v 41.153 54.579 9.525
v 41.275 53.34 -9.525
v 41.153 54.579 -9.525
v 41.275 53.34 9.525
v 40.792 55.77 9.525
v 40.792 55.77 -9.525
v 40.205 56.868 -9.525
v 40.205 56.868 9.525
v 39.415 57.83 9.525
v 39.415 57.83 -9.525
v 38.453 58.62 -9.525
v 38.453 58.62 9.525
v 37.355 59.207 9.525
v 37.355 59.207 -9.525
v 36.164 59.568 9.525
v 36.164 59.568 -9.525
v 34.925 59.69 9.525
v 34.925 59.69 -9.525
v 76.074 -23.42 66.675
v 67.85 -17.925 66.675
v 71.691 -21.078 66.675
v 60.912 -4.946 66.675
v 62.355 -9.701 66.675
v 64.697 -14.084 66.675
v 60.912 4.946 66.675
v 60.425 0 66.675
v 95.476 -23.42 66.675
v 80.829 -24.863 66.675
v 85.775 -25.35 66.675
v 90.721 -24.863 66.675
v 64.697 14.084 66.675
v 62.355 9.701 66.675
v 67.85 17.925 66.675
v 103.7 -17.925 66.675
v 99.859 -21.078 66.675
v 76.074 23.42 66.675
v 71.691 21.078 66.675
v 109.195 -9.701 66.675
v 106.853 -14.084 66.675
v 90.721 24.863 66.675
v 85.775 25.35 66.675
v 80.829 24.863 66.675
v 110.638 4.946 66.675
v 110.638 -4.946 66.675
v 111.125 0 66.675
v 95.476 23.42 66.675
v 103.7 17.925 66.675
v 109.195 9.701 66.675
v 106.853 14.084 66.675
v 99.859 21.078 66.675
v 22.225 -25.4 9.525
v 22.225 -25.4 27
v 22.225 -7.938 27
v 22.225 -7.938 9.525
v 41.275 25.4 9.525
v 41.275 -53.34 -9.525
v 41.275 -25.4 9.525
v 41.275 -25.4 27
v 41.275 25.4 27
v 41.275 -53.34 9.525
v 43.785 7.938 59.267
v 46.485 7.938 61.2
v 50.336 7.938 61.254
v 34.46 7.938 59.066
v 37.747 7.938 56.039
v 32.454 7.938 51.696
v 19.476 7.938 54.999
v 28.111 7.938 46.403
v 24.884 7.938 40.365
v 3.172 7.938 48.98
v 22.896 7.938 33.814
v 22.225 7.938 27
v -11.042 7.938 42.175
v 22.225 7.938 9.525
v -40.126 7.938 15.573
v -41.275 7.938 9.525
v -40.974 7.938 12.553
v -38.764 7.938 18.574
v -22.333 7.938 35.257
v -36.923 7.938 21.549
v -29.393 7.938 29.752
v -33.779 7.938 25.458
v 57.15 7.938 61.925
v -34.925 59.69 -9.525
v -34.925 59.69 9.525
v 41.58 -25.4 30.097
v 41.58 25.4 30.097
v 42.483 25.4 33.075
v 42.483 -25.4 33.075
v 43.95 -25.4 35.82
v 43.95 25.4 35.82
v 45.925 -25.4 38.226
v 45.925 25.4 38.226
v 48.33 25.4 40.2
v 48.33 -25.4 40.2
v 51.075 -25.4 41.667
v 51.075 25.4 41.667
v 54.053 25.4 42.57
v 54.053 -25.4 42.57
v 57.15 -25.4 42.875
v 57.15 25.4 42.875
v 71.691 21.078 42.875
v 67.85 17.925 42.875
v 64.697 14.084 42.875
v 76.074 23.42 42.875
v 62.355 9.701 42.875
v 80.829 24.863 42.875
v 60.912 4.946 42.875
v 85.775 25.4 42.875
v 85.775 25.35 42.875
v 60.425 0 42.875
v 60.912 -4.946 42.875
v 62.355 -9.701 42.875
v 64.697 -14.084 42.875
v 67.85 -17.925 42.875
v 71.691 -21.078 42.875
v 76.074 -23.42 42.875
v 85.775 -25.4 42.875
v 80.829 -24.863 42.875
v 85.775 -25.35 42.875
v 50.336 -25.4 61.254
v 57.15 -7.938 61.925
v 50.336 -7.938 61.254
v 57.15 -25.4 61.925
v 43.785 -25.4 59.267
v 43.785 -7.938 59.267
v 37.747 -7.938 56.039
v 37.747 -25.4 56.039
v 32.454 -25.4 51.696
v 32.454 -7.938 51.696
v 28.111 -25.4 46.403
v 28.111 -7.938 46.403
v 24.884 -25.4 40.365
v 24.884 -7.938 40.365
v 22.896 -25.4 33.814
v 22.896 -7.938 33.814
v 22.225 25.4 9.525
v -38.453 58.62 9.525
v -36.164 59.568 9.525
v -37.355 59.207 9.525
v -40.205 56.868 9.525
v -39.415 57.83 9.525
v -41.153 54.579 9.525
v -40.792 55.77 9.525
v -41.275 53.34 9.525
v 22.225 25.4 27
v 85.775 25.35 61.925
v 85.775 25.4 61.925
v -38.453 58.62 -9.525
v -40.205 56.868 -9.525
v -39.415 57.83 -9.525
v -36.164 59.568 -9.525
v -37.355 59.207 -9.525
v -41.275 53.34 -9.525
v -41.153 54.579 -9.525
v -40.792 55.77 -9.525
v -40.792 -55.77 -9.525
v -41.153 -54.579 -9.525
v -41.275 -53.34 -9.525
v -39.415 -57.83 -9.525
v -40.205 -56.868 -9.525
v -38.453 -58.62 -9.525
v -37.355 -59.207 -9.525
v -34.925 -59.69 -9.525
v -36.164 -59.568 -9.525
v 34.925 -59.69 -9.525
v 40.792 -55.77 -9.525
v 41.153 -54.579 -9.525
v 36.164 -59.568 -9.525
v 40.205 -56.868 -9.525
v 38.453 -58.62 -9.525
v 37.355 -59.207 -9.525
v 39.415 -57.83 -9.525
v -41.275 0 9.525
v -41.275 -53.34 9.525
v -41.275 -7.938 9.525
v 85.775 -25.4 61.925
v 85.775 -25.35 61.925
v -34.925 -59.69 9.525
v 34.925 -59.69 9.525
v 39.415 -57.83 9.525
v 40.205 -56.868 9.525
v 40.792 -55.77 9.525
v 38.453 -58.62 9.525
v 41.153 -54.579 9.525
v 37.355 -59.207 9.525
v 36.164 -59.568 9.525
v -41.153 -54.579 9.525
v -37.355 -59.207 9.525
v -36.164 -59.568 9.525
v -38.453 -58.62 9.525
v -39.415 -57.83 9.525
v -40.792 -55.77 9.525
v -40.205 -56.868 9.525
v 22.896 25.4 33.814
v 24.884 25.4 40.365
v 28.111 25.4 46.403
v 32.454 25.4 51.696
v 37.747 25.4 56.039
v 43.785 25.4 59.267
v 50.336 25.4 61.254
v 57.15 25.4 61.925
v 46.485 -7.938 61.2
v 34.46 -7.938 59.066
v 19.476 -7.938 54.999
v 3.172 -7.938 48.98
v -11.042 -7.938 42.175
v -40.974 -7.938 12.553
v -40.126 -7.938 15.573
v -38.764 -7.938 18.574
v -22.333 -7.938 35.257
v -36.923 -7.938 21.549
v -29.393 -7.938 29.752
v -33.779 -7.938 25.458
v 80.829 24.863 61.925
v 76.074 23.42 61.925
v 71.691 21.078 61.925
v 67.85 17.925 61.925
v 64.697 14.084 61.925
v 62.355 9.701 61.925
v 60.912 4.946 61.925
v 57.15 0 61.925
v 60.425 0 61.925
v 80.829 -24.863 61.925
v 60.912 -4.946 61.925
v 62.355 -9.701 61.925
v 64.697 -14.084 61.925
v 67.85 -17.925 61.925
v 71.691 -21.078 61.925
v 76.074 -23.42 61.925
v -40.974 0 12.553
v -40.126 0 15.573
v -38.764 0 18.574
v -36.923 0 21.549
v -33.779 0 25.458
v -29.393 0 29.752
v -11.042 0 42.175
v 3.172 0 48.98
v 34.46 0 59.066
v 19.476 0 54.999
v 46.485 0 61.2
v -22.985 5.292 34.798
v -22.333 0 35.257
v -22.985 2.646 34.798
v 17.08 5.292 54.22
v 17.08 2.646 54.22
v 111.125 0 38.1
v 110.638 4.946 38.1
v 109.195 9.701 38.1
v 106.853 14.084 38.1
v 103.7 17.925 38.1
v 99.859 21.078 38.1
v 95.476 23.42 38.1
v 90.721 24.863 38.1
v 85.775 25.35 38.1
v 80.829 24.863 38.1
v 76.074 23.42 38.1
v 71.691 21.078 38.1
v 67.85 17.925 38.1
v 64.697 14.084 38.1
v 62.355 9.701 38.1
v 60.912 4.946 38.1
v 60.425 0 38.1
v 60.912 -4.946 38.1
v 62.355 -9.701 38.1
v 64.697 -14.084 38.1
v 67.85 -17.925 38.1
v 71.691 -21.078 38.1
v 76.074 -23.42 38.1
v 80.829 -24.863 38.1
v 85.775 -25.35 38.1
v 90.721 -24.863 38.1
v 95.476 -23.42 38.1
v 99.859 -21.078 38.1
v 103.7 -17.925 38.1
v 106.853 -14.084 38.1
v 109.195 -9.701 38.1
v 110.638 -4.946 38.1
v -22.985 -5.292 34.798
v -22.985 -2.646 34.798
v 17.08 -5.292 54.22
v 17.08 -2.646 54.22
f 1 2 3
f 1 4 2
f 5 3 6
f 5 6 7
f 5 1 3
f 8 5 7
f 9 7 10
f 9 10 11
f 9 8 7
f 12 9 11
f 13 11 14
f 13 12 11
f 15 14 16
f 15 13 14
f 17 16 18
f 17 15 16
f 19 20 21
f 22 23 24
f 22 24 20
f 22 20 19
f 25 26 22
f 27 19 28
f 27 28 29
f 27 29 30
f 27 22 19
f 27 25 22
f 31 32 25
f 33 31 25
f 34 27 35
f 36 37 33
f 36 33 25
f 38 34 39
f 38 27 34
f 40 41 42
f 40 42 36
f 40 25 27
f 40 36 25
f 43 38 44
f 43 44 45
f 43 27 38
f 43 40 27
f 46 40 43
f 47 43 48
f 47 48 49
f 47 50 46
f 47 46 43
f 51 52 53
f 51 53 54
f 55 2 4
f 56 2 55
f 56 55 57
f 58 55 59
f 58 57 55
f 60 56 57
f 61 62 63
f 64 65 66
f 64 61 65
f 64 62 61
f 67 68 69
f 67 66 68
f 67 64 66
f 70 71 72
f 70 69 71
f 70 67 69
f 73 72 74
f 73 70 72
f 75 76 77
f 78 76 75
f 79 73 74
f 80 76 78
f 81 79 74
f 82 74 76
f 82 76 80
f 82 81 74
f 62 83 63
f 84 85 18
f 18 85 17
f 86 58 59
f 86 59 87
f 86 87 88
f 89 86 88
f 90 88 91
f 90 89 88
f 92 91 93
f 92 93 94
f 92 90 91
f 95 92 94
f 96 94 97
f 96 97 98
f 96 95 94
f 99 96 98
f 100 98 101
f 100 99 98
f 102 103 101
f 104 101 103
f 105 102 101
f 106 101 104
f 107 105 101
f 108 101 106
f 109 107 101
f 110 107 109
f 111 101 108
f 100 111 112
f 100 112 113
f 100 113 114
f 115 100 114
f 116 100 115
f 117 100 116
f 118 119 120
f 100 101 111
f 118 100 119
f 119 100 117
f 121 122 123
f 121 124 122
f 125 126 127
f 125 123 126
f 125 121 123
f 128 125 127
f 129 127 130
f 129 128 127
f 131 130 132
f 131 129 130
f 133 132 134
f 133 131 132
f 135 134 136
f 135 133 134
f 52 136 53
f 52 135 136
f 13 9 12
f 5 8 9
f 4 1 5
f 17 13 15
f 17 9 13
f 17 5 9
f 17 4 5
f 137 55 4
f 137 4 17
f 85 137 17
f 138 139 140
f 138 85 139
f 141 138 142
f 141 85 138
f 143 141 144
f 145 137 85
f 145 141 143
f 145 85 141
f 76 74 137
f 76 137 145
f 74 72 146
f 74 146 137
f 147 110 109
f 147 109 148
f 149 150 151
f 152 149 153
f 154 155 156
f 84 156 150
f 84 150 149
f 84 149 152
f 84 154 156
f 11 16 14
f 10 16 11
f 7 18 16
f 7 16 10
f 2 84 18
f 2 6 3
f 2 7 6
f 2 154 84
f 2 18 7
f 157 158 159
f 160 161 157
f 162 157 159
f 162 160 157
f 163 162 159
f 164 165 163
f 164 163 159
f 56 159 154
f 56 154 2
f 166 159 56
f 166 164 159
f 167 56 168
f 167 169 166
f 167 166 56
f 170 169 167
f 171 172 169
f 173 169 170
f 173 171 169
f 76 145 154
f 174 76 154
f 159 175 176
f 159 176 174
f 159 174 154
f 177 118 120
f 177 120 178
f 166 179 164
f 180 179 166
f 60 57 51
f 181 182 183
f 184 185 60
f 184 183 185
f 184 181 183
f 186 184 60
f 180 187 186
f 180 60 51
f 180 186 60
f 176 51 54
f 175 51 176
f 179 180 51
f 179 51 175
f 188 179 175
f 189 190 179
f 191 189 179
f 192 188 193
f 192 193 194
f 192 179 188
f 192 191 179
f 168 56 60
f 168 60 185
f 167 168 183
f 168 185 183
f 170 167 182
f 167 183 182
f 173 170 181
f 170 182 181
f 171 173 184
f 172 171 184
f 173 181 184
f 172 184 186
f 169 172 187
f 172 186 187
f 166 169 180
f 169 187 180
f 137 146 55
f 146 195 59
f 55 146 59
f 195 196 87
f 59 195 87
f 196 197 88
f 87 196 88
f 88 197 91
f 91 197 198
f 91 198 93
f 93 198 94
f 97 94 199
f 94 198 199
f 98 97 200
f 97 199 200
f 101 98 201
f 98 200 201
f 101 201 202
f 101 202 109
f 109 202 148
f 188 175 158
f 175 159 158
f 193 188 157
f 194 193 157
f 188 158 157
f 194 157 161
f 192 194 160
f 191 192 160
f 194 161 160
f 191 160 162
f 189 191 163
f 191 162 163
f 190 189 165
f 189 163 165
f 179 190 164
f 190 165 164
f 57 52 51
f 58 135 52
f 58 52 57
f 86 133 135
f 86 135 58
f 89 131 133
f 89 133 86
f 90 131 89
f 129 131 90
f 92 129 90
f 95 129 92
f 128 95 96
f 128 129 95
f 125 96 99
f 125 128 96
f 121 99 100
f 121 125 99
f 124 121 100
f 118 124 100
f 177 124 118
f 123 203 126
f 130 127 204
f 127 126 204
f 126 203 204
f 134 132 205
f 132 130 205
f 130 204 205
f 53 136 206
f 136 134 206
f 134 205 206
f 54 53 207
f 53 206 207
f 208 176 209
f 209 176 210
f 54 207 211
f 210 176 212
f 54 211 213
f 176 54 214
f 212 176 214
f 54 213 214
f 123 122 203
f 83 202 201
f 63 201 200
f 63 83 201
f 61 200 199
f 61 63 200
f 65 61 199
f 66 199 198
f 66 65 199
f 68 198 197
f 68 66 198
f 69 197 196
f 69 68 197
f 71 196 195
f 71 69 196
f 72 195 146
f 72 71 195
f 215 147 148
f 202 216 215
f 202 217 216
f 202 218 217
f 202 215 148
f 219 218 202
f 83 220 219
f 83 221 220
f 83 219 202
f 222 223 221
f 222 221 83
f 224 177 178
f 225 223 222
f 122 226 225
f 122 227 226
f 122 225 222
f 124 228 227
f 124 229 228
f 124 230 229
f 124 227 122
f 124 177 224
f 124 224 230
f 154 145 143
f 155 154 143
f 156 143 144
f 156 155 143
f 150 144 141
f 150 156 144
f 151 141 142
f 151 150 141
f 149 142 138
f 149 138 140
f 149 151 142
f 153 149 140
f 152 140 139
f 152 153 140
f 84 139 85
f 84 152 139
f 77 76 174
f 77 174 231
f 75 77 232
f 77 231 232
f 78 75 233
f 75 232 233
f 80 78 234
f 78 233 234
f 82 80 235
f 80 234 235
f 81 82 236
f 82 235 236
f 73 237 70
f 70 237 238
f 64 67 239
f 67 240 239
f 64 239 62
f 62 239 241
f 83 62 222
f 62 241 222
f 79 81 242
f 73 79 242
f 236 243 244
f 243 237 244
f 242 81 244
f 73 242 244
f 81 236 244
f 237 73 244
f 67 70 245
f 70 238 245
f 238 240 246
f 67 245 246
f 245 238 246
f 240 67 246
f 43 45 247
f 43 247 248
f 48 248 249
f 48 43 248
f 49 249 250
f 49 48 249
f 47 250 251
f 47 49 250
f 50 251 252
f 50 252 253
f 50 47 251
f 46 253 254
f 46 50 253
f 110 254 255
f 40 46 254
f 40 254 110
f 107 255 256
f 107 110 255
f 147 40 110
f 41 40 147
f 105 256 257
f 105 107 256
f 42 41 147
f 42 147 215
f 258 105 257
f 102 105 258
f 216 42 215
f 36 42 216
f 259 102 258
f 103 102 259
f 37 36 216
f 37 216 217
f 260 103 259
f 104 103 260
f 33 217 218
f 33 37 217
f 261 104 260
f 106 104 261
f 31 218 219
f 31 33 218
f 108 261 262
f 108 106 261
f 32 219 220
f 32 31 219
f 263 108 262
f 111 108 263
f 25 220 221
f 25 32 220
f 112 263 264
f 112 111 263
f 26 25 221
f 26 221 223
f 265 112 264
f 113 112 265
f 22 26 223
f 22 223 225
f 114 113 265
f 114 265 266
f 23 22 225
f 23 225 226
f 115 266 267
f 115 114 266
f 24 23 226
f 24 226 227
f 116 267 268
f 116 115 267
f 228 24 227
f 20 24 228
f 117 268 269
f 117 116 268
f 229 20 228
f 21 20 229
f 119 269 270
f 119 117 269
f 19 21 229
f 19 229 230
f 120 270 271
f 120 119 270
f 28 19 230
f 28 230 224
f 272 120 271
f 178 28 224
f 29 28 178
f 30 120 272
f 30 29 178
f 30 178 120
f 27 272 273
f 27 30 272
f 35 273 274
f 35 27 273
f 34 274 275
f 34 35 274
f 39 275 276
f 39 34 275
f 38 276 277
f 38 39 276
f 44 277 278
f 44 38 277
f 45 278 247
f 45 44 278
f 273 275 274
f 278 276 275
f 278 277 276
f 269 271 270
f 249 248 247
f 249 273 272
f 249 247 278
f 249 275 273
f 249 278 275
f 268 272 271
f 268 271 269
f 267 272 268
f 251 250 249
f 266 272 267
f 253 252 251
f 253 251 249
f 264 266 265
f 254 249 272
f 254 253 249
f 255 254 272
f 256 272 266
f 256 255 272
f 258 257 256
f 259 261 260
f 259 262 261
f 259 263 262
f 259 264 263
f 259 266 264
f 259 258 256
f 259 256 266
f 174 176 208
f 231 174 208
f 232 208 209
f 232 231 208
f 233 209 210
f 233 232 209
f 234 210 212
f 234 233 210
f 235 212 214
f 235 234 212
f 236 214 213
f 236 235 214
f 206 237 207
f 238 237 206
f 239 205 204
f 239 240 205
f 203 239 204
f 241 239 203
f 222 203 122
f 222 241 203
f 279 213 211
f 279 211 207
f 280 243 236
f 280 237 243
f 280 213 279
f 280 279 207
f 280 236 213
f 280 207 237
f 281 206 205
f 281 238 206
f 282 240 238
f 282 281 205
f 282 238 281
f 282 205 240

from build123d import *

# Parameters (mm, degrees)
F1_DEPTH = 59.69
F2_DEPTH = 25.4
F4_DEPTH = 7.9375
F6_R     = 6.35


# Not quite as in the source:
# - a feature of the source that left no trace in its solid (it failed there, or was rolled back) is left out


with BuildPart() as f1:
    # F0 (on Front) → F1 (new body, symmetric)
    with BuildSketch(Plane.XZ):
        Polygon((22.225, 9.525), (-41.275, 9.525), (-41.275, -9.525), (41.275, -9.525), (41.275, 9.525), align=None)
    extrude(amount=F1_DEPTH, both=True)

    # F0 (on Front) → F2 (join, symmetric)
    with BuildSketch(Plane.XZ):
        with BuildLine():
            Line((22.225, 27.0002), (22.225, 9.525))
            Line((22.225, 9.525), (41.275, 9.525))
            Line((41.275, 9.525), (41.275, 27.0002))
            ThreePointArc((41.275, 27.0002), (45.9246798487, 38.2255201513), (57.15, 42.8752))
            Line((57.15, 42.8752), (60.325, 42.8752))
            Line((60.325, 42.8752), (60.325, 61.9252))
            Line((60.325, 61.9252), (57.15, 61.9252))
            ThreePointArc((57.15, 61.9252), (32.4542956671, 51.6959043329), (22.225, 27.0002))
        make_face()
        Polygon((85.7749970019, 61.9252), (60.325, 61.9252), (60.325, 42.8752), (85.7749970019, 42.8752), (85.7749970019, 46.5751625597), align=None)
    extrude(amount=F2_DEPTH, both=True)

    # F0 (on Front) → F4 (join, symmetric)
    with BuildSketch(Plane.XZ):
        with BuildLine():
            add(Edge.make_bspline(
                [(-41.275, 9.525), (-41.1301143467, 35.7692055404), (24.3351403624, 62.0320998132), (57.15, 61.9252)],
                knots=[0, 0, 0, 0, 111.5045361635, 111.5045361635, 111.5045361635, 111.5045361635], degree=3))
            Line((-41.275, 9.525), (22.225, 9.525))
            Line((22.225, 9.525), (22.225, 27.0002))
            ThreePointArc((22.225, 27.0002), (32.4542956671, 51.6959043329), (57.15, 61.9252))
        make_face()
    extrude(amount=F4_DEPTH, both=True)

    # F0 (on Front) → F5 (revolve)
    with BuildSketch(Plane.XZ):
        Polygon((85.7749970019, 66.675), (85.7749970019, 61.9252), (85.7749970019, 46.5751625597), (85.7749970019, 42.8752), (85.7749970019, 38.1), (111.125, 38.1), (111.125, 66.675), align=None)
    revolve(axis=Axis((85.7749970019, 0, 56.6250812799), (0, 0, 1)))

    # F6
    f6_edges = [f1.edges().sort_by_distance(p)[0] for p in [
        (41.275, -59.69, 0),
        (-41.275, -59.69, 0),
        (-41.275, 59.69, 0),
        (41.275, 59.69, 0),
    ]]
    fillet(f6_edges, radius=F6_R)


solid = f1.part
